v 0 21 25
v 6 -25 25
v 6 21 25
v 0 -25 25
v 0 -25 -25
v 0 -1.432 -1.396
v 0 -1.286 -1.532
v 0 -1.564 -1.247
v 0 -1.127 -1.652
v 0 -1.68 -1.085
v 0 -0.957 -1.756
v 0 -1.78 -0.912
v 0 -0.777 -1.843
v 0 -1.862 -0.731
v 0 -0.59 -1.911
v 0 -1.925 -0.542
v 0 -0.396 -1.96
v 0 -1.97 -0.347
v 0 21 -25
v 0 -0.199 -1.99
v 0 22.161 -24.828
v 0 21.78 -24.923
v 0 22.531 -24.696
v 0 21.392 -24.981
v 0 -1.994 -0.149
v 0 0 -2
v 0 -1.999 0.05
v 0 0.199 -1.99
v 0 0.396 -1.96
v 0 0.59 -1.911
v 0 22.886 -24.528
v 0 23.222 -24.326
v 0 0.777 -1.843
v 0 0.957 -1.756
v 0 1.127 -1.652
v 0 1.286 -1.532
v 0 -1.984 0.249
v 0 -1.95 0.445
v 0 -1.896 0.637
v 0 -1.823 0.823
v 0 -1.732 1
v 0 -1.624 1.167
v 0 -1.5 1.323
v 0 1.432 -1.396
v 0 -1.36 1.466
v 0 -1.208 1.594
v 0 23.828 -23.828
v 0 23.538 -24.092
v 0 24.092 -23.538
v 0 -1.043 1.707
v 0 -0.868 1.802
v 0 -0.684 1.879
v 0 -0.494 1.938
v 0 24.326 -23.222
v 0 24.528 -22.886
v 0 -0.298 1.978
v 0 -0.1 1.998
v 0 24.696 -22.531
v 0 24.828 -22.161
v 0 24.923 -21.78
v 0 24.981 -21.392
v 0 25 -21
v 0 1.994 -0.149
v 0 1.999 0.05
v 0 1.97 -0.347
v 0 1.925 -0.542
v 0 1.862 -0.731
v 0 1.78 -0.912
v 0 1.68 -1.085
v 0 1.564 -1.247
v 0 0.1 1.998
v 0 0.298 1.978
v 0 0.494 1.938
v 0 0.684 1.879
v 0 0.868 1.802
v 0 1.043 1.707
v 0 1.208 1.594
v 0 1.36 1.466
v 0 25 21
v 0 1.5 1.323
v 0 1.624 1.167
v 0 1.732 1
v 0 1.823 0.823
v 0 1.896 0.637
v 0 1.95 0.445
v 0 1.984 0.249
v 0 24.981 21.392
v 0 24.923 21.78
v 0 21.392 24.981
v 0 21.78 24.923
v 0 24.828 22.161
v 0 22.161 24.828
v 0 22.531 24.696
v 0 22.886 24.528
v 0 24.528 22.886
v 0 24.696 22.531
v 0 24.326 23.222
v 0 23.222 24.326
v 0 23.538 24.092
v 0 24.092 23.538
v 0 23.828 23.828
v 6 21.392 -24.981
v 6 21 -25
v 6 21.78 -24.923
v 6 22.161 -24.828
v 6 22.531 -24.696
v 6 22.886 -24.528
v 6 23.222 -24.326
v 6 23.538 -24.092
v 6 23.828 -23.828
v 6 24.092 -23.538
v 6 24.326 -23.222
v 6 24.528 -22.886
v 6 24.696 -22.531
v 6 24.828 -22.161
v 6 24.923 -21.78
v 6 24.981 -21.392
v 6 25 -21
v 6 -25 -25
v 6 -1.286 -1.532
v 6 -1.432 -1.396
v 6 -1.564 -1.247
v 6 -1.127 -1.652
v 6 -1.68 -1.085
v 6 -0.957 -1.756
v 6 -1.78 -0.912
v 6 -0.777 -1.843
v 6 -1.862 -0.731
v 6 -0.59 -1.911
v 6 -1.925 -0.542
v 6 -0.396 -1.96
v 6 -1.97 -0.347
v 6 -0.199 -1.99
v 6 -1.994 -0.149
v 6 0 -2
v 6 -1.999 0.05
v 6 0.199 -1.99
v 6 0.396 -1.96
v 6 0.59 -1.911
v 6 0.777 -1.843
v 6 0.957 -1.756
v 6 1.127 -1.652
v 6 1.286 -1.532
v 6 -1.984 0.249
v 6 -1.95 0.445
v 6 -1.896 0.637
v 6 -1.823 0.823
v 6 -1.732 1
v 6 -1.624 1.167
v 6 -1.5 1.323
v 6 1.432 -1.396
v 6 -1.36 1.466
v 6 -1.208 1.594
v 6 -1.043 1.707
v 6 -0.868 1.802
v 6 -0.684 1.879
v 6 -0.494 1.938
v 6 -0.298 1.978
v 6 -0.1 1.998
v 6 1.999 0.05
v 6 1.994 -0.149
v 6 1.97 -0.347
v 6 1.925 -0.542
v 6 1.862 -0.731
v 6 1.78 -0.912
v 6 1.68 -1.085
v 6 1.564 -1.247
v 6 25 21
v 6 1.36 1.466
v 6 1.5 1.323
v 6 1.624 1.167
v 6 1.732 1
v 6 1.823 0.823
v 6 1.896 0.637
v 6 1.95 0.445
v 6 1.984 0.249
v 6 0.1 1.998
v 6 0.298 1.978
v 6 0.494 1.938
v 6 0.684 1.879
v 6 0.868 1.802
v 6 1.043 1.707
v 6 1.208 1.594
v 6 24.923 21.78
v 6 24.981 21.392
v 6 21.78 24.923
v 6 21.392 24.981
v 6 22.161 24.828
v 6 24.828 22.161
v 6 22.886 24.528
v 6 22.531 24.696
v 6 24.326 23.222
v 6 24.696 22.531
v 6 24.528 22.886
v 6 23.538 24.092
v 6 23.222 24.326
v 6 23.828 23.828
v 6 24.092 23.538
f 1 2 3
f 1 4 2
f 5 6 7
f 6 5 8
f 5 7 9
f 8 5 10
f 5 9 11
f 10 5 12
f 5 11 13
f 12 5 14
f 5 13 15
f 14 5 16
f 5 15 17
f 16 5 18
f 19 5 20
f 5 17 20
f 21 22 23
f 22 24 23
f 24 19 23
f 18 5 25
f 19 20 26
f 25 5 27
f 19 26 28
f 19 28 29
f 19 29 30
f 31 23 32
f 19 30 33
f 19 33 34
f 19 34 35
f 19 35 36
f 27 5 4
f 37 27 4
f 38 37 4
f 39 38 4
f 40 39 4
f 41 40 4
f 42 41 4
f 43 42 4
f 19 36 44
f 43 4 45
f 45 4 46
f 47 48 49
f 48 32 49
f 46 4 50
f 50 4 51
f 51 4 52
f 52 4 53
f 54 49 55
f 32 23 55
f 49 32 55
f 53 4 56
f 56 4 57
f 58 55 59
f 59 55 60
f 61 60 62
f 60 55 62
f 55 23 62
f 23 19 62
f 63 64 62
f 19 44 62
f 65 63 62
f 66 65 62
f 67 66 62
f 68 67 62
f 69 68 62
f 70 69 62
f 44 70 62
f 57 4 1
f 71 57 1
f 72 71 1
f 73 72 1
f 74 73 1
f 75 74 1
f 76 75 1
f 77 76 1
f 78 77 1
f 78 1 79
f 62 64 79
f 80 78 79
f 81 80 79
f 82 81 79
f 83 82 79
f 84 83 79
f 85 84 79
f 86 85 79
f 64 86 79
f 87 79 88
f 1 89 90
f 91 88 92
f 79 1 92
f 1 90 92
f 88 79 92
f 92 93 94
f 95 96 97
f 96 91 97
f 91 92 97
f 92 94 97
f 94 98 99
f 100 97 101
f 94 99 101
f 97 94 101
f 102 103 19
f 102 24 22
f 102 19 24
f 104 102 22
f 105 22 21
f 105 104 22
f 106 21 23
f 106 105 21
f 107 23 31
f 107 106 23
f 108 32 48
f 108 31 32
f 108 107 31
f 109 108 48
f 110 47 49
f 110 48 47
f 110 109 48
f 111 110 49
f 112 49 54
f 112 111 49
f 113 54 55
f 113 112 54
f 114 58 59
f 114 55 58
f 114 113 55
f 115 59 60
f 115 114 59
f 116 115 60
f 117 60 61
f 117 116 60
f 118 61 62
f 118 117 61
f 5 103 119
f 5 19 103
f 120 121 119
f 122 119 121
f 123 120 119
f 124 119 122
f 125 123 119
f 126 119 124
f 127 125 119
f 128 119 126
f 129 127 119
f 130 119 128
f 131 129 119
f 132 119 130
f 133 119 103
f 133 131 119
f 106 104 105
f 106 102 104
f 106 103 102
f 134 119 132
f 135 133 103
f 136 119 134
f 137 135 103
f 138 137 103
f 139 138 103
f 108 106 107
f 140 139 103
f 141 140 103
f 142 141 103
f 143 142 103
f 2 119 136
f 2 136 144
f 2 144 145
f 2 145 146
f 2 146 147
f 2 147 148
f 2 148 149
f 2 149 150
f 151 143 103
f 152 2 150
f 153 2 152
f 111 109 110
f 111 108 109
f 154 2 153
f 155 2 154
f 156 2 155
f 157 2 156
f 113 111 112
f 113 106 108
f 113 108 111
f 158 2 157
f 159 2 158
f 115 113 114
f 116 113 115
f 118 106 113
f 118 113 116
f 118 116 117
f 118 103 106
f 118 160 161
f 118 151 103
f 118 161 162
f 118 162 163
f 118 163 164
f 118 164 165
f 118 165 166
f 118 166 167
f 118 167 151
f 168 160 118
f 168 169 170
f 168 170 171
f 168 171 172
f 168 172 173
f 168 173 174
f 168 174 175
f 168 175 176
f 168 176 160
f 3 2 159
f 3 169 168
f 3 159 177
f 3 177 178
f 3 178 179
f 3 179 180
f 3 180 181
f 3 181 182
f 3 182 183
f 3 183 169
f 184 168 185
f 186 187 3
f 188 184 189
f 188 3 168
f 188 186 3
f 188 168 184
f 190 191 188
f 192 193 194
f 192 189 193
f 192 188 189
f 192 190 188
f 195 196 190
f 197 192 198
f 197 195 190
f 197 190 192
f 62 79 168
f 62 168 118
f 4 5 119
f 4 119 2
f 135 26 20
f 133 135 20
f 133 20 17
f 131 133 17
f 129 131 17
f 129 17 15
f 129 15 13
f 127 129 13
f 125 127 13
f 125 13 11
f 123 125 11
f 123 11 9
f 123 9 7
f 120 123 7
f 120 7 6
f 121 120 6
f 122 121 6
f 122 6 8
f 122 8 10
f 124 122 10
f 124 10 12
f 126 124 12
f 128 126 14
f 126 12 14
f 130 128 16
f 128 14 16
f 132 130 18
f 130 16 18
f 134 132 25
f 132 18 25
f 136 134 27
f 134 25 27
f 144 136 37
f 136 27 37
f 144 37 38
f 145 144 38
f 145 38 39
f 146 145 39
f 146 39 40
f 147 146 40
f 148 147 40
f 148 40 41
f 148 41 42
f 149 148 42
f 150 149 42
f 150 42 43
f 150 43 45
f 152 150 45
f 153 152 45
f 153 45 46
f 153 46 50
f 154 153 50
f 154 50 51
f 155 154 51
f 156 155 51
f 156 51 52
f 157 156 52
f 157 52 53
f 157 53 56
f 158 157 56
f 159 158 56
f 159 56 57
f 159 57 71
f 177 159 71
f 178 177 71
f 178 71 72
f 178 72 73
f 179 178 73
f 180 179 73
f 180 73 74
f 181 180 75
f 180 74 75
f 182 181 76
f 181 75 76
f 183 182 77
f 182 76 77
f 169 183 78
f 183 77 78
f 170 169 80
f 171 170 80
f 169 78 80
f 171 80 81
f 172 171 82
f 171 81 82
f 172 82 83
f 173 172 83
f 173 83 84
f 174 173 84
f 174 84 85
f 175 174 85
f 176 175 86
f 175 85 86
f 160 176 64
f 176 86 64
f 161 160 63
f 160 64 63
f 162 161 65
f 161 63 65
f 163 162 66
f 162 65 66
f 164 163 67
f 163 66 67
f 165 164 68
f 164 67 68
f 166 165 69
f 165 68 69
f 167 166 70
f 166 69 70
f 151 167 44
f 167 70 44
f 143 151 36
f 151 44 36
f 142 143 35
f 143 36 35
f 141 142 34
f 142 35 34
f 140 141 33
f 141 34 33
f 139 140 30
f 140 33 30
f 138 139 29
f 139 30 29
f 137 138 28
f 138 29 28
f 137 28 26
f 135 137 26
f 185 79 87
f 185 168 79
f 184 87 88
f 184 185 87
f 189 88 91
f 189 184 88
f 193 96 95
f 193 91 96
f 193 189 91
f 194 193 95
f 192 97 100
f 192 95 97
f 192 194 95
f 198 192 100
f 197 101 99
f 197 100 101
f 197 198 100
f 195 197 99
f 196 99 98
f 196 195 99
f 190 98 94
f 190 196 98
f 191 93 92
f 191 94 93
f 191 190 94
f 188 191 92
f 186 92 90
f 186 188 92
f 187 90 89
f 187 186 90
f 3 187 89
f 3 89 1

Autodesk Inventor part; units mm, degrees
ref_plane "YZ Plane" through (0, 0, 0) normal (1, 0, 0) x (0, 1, 0)
ref_plane "XZ Plane" through (0, 0, 0) normal (0, 1, 0) x (-1, 0, 0)
ref_plane "XY Plane" through (0, 0, 0) normal (0, 0, 1) x (1, 0, 0)
sketch "Sketch1" plane through (0, 0, 0) normal (1, 0, 0) x (0, 1, 0)
  line L0 (-25, 25) -> (25, 25)
  line L1 (25, 25) -> (25, -25)
  line L2 (25, -25) -> (-25, -25)
  line L3 (-25, -25) -> (-25, 25)
  point P0 (0, 0)
  dimension "d0" = 50
  dimension "d1" = 50
  dimension "d2" = 25
  dimension "d3" = 25
extrude "Extrusion1" add sketch "Sketch1" along normal blind 6
sketch "Sketch2" plane through (6, 0, 0) normal (1, 0, 0) x (0, 0, -1)
  point P0 (0, 0)
  point P1 (0, 0)
hole "Hole1" at (6, 0, 0) direction (-1, 0, 0) diameter 4 end through all
fillet "Fillet1" radius 4 2 edges at (3, 25, 25) (3, 25, -25)
equation "\"d0\" = hoop_tabs_width"
equation "\"d1\" = hoop_tabs_width"
equation "\"d2\" = 0.5 * d1"
equation "\"d3\" = 0.5 * d0"
equation "\"d4\" = hoop_tabs_thickness"
equation "\"d6\" = hoop_tabs_hole"
equation "\"d13\" = hoop_tabs_hole"
equation "\"hoop_angle_z\" = 45deg"
equation "\"hoop_bearing_length\" = 5deg"
equation "\"hoop_cable_diam\" = 5"
equation "\"hoop_cable_pulley_diam\" = 22"
equation "\"rack_tooth_addendum\" = 5"
equation "\"rack_tooth_dedendum\" = 5"
equation "\"rack_tooth_thickness\" = 5"
equation "\"secure_arm_angle\" = 20deg"
equation "\"secure_arm_hold_length\" = 35"
equation "\"secure_arm_radii\" = 9"
equation "\"support_baseClamp_platformLengthBuffer\" = 35"
equation "\"support_baseClamp_platformThickness\" = 15"
equation "\"support_baseClamp_platformWidthBuffer\" = 0"
equation "\"support_baseClamp_sleeveHoleDiameter\" = 12"
equation "\"support_baseClamp_sleeveSweepTerminationAngle\" = 55deg"
equation "\"support_baseClamp_thickness\" = 8"
equation "\"support_frame_endHoleBuffer\" = 25"
equation "\"support_frame_squareBarFillet\" = 2"
equation "\"support_frame_squareBarThickness\" = 5"
equation "\"hoop_tabs_width\" = 50"
equation "\"hoop_tabs_thickness\" = 6"
equation "\"hoop_tabs_hole\" = 4"
properties part number "hoop_tab"
